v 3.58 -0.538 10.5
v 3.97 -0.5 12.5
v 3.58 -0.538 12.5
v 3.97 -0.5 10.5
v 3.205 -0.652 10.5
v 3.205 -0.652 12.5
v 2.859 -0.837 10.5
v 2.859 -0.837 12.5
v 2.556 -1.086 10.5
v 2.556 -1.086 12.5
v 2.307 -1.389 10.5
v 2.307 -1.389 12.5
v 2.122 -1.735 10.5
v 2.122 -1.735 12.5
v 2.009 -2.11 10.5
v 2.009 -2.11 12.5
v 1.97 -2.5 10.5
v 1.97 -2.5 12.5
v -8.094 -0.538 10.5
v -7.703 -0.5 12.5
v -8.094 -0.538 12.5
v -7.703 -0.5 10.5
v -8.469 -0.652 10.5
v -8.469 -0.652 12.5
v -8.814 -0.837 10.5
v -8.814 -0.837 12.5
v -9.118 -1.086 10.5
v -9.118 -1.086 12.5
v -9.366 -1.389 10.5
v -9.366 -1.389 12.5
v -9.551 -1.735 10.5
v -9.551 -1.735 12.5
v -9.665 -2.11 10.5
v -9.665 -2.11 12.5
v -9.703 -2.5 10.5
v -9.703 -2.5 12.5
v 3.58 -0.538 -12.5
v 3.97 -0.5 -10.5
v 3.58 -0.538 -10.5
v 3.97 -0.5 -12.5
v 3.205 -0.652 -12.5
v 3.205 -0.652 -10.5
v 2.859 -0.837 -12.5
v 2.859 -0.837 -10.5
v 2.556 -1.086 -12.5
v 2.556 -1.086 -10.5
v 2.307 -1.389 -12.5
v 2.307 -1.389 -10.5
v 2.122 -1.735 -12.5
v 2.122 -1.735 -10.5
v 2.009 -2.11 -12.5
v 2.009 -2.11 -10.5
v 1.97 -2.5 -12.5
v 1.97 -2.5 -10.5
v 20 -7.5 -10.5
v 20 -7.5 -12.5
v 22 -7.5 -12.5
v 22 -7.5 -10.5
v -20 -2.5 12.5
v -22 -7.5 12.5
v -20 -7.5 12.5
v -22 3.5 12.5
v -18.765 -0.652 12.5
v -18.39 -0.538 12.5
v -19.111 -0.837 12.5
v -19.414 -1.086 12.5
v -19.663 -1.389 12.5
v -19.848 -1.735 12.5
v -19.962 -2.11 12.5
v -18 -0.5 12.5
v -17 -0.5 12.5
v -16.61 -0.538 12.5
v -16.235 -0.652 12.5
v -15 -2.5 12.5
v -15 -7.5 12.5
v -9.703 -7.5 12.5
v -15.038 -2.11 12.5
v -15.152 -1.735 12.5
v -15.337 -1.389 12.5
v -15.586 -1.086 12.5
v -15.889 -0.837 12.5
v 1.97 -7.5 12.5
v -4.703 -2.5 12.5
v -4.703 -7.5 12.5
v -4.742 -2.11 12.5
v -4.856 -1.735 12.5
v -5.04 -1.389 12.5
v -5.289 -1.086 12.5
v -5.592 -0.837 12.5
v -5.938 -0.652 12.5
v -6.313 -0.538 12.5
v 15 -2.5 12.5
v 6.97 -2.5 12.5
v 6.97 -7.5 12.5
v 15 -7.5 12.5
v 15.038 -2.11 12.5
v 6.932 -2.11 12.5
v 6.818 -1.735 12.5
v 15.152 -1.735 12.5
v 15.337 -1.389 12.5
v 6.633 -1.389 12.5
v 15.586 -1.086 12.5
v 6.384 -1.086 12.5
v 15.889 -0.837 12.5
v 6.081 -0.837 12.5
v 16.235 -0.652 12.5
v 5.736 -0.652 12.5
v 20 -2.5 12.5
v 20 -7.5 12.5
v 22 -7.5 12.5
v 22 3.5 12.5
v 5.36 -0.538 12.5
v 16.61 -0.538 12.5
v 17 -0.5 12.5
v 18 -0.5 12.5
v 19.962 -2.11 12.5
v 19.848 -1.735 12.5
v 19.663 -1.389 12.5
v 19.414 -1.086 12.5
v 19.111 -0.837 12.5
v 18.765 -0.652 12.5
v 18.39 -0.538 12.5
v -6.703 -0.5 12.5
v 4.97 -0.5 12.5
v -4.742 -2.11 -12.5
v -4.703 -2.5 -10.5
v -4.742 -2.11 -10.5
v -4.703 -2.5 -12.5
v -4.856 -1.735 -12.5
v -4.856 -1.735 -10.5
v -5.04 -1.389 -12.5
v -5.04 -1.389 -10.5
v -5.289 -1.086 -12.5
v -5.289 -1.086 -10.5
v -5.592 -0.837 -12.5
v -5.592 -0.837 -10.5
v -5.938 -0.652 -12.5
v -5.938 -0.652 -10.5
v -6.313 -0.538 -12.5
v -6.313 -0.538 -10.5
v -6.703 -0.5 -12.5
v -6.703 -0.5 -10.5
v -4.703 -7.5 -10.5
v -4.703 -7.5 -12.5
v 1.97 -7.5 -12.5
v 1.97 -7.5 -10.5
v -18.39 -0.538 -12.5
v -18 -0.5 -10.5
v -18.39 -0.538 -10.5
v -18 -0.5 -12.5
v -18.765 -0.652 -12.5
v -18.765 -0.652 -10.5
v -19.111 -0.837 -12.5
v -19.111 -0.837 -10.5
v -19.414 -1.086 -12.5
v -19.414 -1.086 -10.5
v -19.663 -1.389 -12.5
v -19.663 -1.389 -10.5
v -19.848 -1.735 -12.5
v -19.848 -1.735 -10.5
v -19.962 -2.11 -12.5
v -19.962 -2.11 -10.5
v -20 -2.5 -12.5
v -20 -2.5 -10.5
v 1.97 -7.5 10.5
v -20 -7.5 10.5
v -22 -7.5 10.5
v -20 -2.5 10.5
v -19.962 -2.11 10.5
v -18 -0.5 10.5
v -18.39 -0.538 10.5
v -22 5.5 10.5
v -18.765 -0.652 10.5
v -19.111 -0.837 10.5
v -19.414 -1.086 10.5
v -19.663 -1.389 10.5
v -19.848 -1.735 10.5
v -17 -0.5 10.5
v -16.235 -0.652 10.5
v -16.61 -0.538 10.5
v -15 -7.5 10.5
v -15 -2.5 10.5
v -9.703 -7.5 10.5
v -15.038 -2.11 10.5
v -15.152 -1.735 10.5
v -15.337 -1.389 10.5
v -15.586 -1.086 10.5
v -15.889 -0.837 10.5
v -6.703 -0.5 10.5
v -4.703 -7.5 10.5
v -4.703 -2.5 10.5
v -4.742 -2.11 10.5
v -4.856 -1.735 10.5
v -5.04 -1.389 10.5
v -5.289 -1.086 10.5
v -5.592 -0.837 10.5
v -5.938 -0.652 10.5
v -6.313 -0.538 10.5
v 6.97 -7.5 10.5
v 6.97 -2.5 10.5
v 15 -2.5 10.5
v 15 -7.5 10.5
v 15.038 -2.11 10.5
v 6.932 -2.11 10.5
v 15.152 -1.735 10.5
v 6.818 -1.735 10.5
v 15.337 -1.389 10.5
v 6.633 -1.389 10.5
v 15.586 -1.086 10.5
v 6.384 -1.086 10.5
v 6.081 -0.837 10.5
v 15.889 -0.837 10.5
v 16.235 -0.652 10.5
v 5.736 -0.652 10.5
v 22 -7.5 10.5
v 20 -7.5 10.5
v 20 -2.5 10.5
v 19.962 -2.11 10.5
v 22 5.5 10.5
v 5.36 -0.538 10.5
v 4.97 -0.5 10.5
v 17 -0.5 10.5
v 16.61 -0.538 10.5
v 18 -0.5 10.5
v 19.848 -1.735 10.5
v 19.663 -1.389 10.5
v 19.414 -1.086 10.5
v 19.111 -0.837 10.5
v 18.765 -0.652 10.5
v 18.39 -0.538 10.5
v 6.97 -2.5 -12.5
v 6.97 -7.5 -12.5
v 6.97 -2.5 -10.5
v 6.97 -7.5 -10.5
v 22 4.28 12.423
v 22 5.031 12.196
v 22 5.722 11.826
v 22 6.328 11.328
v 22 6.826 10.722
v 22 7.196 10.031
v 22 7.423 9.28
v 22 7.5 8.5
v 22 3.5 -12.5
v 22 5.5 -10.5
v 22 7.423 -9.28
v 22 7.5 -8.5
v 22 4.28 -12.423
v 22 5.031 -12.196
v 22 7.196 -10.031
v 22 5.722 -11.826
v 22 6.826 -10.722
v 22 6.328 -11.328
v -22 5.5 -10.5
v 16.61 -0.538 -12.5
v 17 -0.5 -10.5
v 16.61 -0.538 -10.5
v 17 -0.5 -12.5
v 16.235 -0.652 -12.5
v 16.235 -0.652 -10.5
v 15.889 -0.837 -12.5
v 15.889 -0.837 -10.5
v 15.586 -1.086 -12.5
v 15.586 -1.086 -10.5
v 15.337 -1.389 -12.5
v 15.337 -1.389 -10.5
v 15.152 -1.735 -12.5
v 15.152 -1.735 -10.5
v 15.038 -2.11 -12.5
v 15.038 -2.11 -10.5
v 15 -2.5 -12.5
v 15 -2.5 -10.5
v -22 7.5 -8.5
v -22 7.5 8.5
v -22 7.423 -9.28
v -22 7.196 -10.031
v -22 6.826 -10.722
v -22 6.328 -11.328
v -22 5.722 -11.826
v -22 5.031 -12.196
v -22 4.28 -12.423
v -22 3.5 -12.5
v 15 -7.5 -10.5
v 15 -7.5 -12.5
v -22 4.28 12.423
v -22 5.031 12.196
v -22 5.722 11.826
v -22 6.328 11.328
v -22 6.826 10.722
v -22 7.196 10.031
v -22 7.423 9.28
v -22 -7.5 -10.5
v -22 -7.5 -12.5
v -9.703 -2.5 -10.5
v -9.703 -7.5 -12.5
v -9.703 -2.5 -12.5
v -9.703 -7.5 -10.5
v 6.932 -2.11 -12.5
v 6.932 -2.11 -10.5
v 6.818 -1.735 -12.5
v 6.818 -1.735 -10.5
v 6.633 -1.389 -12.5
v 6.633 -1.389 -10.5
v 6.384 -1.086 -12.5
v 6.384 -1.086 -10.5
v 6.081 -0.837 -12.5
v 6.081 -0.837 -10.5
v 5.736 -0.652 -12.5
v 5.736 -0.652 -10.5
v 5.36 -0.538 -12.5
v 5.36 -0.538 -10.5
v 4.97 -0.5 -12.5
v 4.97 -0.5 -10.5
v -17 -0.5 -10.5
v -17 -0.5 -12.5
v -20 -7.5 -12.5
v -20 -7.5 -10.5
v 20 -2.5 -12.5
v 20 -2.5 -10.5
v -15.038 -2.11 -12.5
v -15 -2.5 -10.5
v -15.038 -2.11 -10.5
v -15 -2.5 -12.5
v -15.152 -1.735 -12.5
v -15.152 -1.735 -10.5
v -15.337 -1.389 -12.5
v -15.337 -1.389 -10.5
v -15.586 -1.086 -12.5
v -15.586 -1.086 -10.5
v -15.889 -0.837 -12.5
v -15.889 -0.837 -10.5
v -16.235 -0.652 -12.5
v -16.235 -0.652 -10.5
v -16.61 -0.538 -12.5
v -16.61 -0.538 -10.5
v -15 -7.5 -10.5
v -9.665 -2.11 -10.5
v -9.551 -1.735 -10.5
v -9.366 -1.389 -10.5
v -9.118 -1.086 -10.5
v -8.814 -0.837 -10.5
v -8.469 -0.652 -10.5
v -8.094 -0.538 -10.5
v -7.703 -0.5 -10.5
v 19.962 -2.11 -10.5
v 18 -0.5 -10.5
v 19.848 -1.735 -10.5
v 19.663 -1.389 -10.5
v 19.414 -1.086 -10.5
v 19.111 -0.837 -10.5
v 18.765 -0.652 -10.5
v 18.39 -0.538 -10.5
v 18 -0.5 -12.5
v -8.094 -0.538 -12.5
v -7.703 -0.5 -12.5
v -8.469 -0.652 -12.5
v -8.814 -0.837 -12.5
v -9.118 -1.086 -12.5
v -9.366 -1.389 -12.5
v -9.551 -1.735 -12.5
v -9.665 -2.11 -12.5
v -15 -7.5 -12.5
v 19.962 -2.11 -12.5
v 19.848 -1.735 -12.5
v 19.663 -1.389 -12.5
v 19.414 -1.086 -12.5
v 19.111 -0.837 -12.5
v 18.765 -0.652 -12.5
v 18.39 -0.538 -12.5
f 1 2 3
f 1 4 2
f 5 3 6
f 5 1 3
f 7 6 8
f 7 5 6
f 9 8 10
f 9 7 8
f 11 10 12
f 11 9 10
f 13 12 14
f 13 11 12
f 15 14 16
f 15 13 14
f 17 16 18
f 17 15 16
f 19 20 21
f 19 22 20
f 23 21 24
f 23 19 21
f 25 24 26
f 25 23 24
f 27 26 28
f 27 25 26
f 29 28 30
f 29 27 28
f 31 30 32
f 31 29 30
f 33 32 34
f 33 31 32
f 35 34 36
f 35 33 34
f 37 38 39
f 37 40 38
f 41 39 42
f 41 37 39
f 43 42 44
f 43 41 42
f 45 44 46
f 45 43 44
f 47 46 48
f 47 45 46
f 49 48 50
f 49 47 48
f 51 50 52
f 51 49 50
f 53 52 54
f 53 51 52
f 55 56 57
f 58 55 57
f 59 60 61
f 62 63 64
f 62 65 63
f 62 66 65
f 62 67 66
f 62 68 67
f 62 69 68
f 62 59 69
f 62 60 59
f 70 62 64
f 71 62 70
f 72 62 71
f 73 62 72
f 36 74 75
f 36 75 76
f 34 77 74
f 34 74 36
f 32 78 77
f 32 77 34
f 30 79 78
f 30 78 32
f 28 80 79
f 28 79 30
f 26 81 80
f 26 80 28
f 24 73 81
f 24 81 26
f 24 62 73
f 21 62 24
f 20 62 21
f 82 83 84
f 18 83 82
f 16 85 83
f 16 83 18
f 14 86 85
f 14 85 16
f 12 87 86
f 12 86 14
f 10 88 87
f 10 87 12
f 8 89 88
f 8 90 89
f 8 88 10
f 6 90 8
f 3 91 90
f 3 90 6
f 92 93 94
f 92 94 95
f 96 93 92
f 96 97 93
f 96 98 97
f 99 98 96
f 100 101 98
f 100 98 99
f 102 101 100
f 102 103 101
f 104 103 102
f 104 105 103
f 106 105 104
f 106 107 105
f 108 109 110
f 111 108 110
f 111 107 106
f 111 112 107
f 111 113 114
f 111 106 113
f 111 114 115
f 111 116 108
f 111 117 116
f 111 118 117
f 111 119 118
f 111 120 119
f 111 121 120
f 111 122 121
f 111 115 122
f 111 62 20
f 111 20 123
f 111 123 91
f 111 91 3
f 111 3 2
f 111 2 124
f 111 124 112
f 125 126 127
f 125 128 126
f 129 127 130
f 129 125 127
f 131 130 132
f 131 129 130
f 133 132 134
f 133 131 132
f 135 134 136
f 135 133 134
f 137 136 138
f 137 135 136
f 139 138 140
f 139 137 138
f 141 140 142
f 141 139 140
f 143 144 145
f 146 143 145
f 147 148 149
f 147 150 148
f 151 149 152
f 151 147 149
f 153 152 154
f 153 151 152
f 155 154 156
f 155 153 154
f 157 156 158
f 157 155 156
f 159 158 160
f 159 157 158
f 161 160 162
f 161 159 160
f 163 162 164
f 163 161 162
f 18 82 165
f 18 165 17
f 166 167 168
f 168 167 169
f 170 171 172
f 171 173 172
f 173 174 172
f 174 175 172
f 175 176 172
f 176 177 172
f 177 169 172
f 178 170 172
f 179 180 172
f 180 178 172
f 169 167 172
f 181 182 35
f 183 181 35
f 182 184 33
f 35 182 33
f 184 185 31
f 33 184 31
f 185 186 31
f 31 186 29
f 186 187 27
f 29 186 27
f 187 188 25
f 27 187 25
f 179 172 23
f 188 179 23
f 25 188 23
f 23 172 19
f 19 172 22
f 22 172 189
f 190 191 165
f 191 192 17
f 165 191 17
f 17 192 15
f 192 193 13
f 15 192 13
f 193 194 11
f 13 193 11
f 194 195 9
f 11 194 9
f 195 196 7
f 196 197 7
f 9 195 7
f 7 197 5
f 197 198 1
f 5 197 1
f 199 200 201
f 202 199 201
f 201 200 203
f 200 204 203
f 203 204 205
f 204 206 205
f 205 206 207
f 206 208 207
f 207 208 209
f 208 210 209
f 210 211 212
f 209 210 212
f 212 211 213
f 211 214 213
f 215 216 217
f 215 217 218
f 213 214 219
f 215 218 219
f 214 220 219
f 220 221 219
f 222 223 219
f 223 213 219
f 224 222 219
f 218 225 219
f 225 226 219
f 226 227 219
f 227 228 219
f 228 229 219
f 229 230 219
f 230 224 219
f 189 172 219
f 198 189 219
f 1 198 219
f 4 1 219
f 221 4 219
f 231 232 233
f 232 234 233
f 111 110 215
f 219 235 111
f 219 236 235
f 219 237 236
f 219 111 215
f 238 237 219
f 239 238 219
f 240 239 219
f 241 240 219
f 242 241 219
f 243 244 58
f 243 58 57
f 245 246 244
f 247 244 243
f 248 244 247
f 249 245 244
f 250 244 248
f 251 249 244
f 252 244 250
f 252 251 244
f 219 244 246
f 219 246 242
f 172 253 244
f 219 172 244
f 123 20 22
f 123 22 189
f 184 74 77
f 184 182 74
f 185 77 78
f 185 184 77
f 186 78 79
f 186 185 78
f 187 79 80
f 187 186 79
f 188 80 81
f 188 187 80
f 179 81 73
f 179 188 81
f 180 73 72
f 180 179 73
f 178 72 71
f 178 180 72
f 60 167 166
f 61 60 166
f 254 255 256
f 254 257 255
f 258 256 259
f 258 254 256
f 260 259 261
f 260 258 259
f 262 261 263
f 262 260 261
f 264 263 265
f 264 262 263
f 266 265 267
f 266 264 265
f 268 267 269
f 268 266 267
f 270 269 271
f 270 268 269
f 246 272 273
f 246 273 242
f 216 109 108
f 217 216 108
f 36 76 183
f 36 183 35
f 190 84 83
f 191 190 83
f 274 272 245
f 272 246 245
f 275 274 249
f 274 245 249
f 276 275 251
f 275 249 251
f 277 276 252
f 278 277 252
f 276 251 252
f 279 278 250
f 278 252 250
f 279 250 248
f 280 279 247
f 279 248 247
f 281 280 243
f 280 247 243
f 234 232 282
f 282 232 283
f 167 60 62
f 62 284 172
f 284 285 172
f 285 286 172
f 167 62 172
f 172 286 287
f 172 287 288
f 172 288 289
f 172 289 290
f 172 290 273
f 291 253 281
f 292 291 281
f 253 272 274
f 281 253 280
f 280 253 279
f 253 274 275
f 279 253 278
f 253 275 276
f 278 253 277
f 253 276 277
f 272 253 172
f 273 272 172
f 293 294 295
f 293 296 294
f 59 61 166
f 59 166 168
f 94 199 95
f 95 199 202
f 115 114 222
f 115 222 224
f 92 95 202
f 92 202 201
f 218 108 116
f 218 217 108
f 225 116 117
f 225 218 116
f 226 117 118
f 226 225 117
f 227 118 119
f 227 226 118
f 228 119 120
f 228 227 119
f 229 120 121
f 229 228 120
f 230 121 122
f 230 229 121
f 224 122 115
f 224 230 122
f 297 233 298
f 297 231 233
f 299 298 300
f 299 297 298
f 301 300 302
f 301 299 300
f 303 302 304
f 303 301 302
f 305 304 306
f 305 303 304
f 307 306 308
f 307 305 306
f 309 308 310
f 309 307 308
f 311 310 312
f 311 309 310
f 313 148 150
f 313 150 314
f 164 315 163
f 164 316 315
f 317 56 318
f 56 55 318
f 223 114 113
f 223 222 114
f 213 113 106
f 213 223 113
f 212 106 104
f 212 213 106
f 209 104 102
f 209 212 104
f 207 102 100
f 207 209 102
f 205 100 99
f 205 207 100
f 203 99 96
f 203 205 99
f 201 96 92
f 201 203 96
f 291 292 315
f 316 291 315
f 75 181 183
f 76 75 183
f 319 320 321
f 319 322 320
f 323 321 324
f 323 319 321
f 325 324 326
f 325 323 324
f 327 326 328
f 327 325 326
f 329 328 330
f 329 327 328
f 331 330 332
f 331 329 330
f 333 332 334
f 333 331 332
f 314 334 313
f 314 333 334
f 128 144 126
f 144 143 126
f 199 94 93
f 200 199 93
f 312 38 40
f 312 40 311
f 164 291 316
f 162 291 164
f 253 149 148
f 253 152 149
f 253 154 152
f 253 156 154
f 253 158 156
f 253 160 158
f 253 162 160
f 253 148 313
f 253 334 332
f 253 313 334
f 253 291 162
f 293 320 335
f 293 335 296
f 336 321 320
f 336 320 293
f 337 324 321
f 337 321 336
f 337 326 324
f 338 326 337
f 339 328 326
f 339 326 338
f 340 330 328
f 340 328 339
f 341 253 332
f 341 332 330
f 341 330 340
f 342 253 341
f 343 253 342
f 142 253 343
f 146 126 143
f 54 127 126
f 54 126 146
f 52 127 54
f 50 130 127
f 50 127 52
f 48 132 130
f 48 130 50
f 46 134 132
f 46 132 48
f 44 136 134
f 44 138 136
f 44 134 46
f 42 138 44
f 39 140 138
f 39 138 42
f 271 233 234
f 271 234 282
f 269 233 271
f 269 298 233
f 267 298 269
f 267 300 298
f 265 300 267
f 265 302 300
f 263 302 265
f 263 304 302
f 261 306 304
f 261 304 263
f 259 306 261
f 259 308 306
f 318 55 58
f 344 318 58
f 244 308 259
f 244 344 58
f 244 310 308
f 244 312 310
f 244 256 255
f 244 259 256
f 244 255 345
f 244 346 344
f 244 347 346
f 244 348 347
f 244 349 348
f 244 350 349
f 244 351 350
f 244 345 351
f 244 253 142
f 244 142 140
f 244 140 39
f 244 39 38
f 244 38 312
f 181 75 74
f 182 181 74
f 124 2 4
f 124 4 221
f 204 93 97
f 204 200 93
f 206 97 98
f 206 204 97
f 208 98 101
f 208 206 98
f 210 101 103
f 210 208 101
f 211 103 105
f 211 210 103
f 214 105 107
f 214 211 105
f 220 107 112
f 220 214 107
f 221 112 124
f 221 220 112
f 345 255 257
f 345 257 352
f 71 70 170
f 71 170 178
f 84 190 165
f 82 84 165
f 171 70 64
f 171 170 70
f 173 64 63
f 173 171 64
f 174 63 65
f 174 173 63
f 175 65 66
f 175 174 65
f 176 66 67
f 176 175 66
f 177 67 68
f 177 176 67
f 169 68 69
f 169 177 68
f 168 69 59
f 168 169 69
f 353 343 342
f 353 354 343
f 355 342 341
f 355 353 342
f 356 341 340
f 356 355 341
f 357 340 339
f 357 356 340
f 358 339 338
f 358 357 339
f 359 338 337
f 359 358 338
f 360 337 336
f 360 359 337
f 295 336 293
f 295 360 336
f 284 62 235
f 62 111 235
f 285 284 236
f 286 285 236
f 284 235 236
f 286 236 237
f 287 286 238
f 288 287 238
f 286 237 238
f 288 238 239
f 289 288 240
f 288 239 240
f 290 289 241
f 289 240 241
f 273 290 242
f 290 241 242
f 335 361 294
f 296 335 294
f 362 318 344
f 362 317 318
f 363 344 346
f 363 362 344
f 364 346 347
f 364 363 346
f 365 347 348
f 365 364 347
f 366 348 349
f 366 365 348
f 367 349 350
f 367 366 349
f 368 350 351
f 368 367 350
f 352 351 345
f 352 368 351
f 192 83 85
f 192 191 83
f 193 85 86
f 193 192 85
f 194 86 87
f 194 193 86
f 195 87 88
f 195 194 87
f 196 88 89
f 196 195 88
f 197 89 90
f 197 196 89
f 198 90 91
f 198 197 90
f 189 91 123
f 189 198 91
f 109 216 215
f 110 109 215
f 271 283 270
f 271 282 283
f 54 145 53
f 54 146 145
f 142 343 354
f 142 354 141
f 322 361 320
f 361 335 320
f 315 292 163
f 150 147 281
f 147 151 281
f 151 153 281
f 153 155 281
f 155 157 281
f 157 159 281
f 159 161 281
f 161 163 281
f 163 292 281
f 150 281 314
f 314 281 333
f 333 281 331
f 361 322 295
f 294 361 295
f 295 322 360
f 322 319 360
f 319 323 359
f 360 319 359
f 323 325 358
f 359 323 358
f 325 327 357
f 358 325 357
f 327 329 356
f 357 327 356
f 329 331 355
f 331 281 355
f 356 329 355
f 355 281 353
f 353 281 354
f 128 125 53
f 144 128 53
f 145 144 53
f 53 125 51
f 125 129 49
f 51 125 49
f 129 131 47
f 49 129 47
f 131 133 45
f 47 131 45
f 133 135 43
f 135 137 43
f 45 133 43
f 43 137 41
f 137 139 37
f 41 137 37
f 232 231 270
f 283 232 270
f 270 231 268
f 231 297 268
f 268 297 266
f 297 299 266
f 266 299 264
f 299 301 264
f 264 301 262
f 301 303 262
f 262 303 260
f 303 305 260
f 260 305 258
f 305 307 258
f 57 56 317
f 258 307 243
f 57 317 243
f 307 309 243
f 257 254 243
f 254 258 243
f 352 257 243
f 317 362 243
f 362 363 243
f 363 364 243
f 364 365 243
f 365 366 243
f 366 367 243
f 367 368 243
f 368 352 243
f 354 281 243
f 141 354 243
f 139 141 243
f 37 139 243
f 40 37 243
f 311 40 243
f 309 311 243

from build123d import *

# Parameters (mm, degrees)
ESBO_O1_W                = 44
ESBO_O1_H                = 25
RESSALTO_EXTRUS_O1_DEPTH = 7.5
CASCA1_T                 = -2
ESBO_O2_W                = 5
ESBO_O2_H                = 14
CORTE_EXTRUS_O1_DEPTH    = 35.135758377
FILETE1_R                = 2
FILETE2_R                = 4


with BuildPart() as part:
    # Esboço1 → Ressalto-extrusão1 (new, symmetric)
    with BuildSketch(Plane(origin=(0, 0, 0), x_dir=(1, 0, 0), z_dir=(0, 1, 0))):
        Rectangle(ESBO_O1_W, ESBO_O1_H)
    extrude(amount=RESSALTO_EXTRUS_O1_DEPTH, both=True)

    # Casca1
    casca1_openings = [part.faces().sort_by_distance(p)[0] for p in [
        (0, -7.5, 0),
        (-22, 0, 0),
        (22, 0, 0),
    ]]
    offset(amount=CASCA1_T, openings=casca1_openings, kind=Kind.INTERSECTION)

    # Esboço2 → Corte-extrusão1 (cut, through all)
    with BuildSketch(Plane.XY.offset(12.5)):
        with Locations((-7.203332481, -7.5)):
            Rectangle(ESBO_O2_W, ESBO_O2_H)
        with Locations((-17.5, -7.5)):
            Rectangle(ESBO_O2_W, ESBO_O2_H)
        with Locations((4.47023527, -7.5)):
            Rectangle(ESBO_O2_W, ESBO_O2_H)
        with Locations((17.5, -7.5)):
            Rectangle(ESBO_O2_W, ESBO_O2_H)
    extrude(amount=-CORTE_EXTRUS_O1_DEPTH, mode=Mode.SUBTRACT)

    # Filete1
    filete1_edges = [part.edges().sort_by_distance(p)[0] for p in [
        (20, -0.5, -11.5),
        (15, -0.5, -11.5),
        (20, -0.5, 11.5),
        (15, -0.5, 11.5),
        (-15, -0.5, -11.5),
        (-20, -0.5, -11.5),
        (-15, -0.5, 11.5),
        (-20, -0.5, 11.5),
        (-4.703332481, -0.5, -11.5),
        (-9.703332481, -0.5, -11.5),
        (-4.703332481, -0.5, 11.5),
        (-9.703332481, -0.5, 11.5),
        (6.97023527, -0.5, -11.5),
        (1.97023527, -0.5, -11.5),
        (6.97023527, -0.5, 11.5),
        (1.97023527, -0.5, 11.5),
    ]]
    fillet(filete1_edges, radius=FILETE1_R)

    # Filete2
    filete2_edges = [part.edges().sort_by_distance(p)[0] for p in [
        (0, 7.5, 12.5),
        (0, 7.5, -12.5),
    ]]
    fillet(filete2_edges, radius=FILETE2_R)


solid = part.part
